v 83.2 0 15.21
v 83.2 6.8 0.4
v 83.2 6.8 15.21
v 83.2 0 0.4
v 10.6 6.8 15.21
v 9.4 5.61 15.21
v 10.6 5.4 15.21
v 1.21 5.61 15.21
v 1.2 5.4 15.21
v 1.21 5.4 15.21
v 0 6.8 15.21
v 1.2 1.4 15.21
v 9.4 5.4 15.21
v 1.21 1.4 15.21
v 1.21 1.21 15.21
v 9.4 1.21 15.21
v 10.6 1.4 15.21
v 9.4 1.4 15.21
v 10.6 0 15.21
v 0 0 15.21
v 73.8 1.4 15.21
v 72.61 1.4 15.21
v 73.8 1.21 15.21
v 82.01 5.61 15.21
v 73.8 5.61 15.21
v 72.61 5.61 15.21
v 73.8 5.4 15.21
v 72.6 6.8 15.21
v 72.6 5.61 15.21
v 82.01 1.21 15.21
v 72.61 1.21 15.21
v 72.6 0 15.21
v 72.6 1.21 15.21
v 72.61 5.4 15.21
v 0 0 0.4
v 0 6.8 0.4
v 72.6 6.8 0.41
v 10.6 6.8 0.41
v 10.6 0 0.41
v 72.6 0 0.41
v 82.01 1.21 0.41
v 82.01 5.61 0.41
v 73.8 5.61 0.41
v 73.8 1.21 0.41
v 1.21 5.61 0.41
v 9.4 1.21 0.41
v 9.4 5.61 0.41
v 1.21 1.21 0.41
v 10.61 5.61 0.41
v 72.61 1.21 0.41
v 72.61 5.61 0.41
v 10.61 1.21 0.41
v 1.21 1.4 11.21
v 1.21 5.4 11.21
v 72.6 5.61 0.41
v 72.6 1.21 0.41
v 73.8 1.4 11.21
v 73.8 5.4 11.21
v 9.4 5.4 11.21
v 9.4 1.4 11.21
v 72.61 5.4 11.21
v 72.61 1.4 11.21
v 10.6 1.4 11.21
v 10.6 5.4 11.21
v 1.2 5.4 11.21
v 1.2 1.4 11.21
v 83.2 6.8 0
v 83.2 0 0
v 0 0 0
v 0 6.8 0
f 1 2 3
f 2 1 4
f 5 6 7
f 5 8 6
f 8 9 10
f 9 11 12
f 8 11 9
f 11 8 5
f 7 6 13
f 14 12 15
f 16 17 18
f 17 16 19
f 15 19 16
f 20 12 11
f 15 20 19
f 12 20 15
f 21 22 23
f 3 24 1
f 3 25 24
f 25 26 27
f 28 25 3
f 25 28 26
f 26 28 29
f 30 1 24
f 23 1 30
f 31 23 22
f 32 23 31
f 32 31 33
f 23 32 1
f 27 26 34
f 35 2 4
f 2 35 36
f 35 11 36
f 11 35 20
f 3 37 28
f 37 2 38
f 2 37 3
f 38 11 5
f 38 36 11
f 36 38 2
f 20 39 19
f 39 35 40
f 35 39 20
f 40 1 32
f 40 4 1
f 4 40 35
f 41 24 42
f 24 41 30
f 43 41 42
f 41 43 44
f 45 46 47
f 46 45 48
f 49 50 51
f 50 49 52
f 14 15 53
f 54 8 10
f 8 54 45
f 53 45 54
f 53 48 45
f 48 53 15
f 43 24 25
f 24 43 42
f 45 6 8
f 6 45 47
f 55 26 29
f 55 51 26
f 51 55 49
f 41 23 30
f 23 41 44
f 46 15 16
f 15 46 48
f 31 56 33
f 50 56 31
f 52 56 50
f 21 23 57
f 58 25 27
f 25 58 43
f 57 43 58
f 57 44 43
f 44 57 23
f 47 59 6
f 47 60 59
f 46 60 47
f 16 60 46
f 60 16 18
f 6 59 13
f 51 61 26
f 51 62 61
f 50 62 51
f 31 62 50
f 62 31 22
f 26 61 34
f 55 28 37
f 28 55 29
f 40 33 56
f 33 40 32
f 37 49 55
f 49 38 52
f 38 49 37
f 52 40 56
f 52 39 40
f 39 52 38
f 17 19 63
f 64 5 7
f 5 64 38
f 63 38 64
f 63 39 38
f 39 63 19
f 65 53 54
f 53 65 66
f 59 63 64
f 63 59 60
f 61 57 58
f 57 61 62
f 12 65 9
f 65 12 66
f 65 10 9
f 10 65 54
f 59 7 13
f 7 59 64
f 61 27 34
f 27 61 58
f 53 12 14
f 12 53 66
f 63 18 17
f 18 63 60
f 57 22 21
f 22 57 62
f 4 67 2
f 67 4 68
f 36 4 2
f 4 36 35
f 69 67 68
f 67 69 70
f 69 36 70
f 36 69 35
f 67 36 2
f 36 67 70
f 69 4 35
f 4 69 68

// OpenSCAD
// file: ../../Base/Rotation.scad
// Fischertechnik Box Foundation
// Geometry Helpers Rotation

include <PlacementOptions.scad>

// getRotatedSpace(space, rotation=NoRotation)
// Rotates the space dependent on the specified rotation

function getRotatedSpace(space, rotation=NoRotation) = [
    (rotation == Rotate90 || rotation == Rotate270) ? space.y : space.x,
    (rotation == Rotate90 || rotation == Rotate270) ? space.x : space.y
];

// Rotates the given space around the fixed left lower corner
// space = the space the children needs as width/depth list [width,depth]
// rotation = 0 Rotate0 degrees, 1 Rotate90 degrees, 2 Rotate180 degrees, 3 Rotate270 degrees (equivalent to -90)

module RotateFix(space, rotation=NoRotation) {
    dy = (rotation == Rotate0 || rotation == Rotate270) ? 0 :
        (rotation == Rotate90) ? space.x :
        space.y;
    dx = (rotation < Rotate180) ? 0 :
        (rotation == Rotate180) ? space.x :
        space.y;
    
    translate([dx, dy, 0])
        rotate([0, 0, rotations[rotation]])
            children();
}
// file: ../../Base/Alignment.scad
// Fischertechnik Box Foundation
// Geometry Helpers Alignment

include <PlacementOptions.scad>

// getAlignedX(elementWidth, spaceWidth, align=AlignRight, offset=0)
// Gets the aligned X offset of an element with the given
// width in the given space.
// elementWidth = The width of the element to positon
// spaceWidth = The space where the element should be aligned
// align = 0 AlignLeft, 1 AlignCenter, 2 AlignRight
// offset = an optional offset from the aligned position. When
// aligned left or centered, then positive values are in X direction.
// When aligned right then positive values are in negative X direction.

function getAlignedX(elementWidth, spaceWidth, align=AlignRight, offset=0) =
    (align == AlignLeft) ?
        offset :
        ((align == AlignCenter) ?
        (spaceWidth - elementWidth)/2 + offset :
        spaceWidth - offset - elementWidth);

// getAlignedY(elementDepth, spaceDepth, align=AlignTop, offset=0)
// Gets the aligned Y offset of an element with the given
// depth in the given space.
// elementDepth = The depth of the element to positon
// spaceDepth = The space where the element should be aligned
// align = 0 AlignBottom, 1 AlignCenter, 2 AlignTop
// offset = an optional offset from the aligned position. When
// aligned bottom or centered, then positive values are in Y direction.
// When aligned top then positive values are in negative Y direction.

function getAlignedY(elementDepth, spaceDepth, align=AlignTop, offset=0) =
    (align == AlignBottom) ?
        offset :
        ((align == AlignCenter) ?
        (spaceDepth - elementDepth)/2 + offset :
        spaceDepth - offset - elementDepth);
// file: ../../Base/Boxes.scad
// Fischertechnik Box Foundation
// Pre-designed Boxes

use <Constants.scad>

include <PlacementOptions.scad>

box190Width = 190;
box190Depth = 130;
box130Width = 130;
box130Depth = 95;

// Values are from an original ec3 box
topBottomDifference = 1.5;
outerHeight = 40;
innerHeight = 38.2;
baseThickness = outerHeight - innerHeight;
stackExcess = 5.7;
radius = 3.5;
wallThickness = 1.5;
tolerance = 0.2;
stackOffset = innerHeight - stackExcess;

boxUsageHeight = stackOffset;
boxWallThickness = wallThickness;
boxBaseThickness = baseThickness;
boxWebWidth = 3.0;

// getBoxWallThickness()
// Gets the wall thickness of a Fischertechnik Box
function getBoxWallThickness() = boxWallThickness;

// getBoxUsageHeight()
// Gets the usable height of a Fischertechnik box
function getBoxUsageHeight() = boxUsageHeight;

// getBoxInnerHeight()
// Gets the inner height of a Fischertechnik box, including the stack excess
function getBoxInnerHeight() = innerHeight;

// getBoxBaseThickness()
// Gets the thickness of the Fischertechnik box base.
function getBoxBaseThickness() = boxBaseThickness;

// getBoxWebWidth()
// Gets the width of a box web
function getBoxWebWidth() = boxWebWidth;

// getBox190Space()
// Gets the usable inner space of a Box 190 as an x/y-list
function getBox190Space() = [
    box190Width - 2*getBoxWallThickness() - topBottomDifference, 
    box190Depth - 2*getBoxWallThickness() - topBottomDifference ];

// BoxBase(width, depth)
// Creates an empty stackable Fischertechnik compatible box
// width = Outer width of the box (190, 130, ...)
// depth = Outer depth of the box (130, 95, ...)

module BoxBase(width, depth, height=outerHeight) {    
    thinPlate = 0.01;

    innerHeight = height - baseThickness;    
    
    module BodyPlate(width, depth) {
        translate([radius, radius])
        hull() {
            w = width-2*radius;
            d = depth-2*radius;
            cube([w, d, thinPlate]);
            cylinder(thinPlate, r=radius, $fn=getFragments());
            translate([w, 0])
                cylinder(thinPlate, r=radius, $fn=getFragments());
            translate([w, d])
                cylinder(thinPlate, r=radius, $fn=getFragments());
            translate([0, d])
                cylinder(thinPlate, r=radius, $fn=getFragments());
        }
    }
    
    module Body(tolerance=tolerance) {
        hull() {
            // Bottom with tolerance to fit into the original boxes when stacked
            translate([-wallThickness+tolerance, -wallThickness+tolerance, -baseThickness])
                BodyPlate(width-topBottomDifference-2*tolerance, depth-topBottomDifference-2*tolerance);
            
            // Top
            translate([-wallThickness-topBottomDifference/2, -wallThickness-topBottomDifference/2, innerHeight-thinPlate])
                BodyPlate(width, depth);
         }
    }

    module Cutoff() {
        hull() {
            coWidth = width - 2*wallThickness;
            coDepth = depth - 2*wallThickness;
            
            // Bottom
            BodyPlate(coWidth-topBottomDifference, coDepth-topBottomDifference);

            // Top
            translate([-topBottomDifference/2, -topBottomDifference/2, innerHeight+thinPlate]) 
                BodyPlate(coWidth, coDepth);
        }
    }
    
    difference() {        
        Body();
        Cutoff();
        stackOffset = innerHeight - stackExcess;
        translate([0, 0, stackOffset + baseThickness])
            Body(tolerance=0);
    }
}

// Creates the Fischertechnik empty box 130x190 mm and places it at position 0,0
// 190x130 are the outer sizes, the inner space is slightly smaller. Use getBox190Space() to get the inner sizes.
// The box is positioned that the usable inner space is at the 0,0,0 position. The

module Box190() {
    BoxBase(box190Width, box190Depth);
}

// Gets the usable inner space of a Box 130 as an x/y-list
function getBox130Space() = [
    box130Width - 2*getBoxWallThickness() - topBottomDifference, 
    box130Depth - 2*getBoxWallThickness() - topBottomDifference ];

// Creates the Fischertechnik empty box 95x130 mm and places it at position 0,0
// 190x130 are the outer sizes, the inner space is slightly smaller. Use getBox190Space() to get the inner sizes.
// The box is positioned that the usable inner space is at the 0,0,0 position. The

module Box130() {
    BoxBase(box130Width, box130Depth);
}

// Creates a web at the specified box walls
// corner 0 = LowerLeft, 1 = UpperLeft, 2 = UpperRight, 3 = LowerRight
// side 0 = LeftOfCorner, 1 = RightOfCorner
// distance = Distance in mm from the corner
// boxSpace = inner width and depth of the box (default: Box 190)
// webWidth = length of the web (default is 3 mms)
// webThickness = thickness of the web (default is 1 mm)

module BoxWeb(corner, side, distance, boxSpace=getBox190Space(), webWidth=getBoxWebWidth(), webThickness=1.0) {
    sink = getBoxWallThickness()/2;

    width = (corner % 2 == 0) ? 
            (side == LeftOfCorner ? webWidth : webThickness) :
            (side == LeftOfCorner ? webThickness : webWidth);

    depth = (corner % 2 == 0) ? 
            (side == RightOfCorner ? webWidth : webThickness) :
            (side == RightOfCorner ? webThickness : webWidth);
    
    xDiff = corner == LowerLeft ? 
                (side == LeftOfCorner ? -sink : distance) :
            (corner == UpperLeft ?                
                (side == LeftOfCorner ? distance : -sink) :
            (corner == UpperRight ?
                (side == LeftOfCorner ? boxSpace.x-webWidth+sink : boxSpace.x-distance-webThickness) :
                (side == LeftOfCorner ? boxSpace.x-distance-webThickness: boxSpace.x-webWidth+sink)));

    yDiff = corner == LowerLeft ? 
                (side == RightOfCorner ? -sink : distance) :
            (corner == UpperLeft ?
                (side == RightOfCorner ? boxSpace.y-distance : boxSpace.y-webWidth+sink) :
            (corner == UpperRight ?
                (side == RightOfCorner ? boxSpace.y-webWidth+sink : boxSpace.y-distance) :
                (side == RightOfCorner ? distance : -sink)));
    
    translate([xDiff, yDiff, -getExcess()])
        cube([width, depth, boxUsageHeight + 2*getExcess()]);
}
// file: ../../Base/PlacementOptions.scad
// Fischertechnik Box Foundation
// Placement Options

// Alignment
NoAlign = 0;
AlignLeft = 1;
AlignBottom = 2;
AlignCenter = 3;
AlignRight = 4;
AlignTop = 5;

// Element rotation degree steps
rotations = [0, -90, -180, -270];

// Rotation
NoRotation = 0;
Rotate0 = 0;
Rotate90 = 1;
Rotate180 = 2;
Rotate270 = 3;

// Docking (seen from above)
NoDock = -1;
DockLeft = 0;
DockTop = 1;
DockRight = 2;
DockCorner = 2;
DockBottom = 3;

// Web corners
LowerLeft = 0;
UpperLeft = 1;
UpperRight = 2;
LowerRight = 3;

// Web position relative to corner
LeftOfCorner = 0;
RightOfCorner = 1;
// file: ../../Base/Placement.scad
// Fischertechnik Box Foundation
// Geometry Helpers Placement

use <Constants.scad>
use <Alignment.scad>
use <Rotation.scad>
use <Boxes.scad>

include <PlacementOptions.scad>

// Place(x=0, y=0, elementSpace=[0,0], alignX=AlignLeft, alignY=AlignBottom, rotation=Rotate0, boxSpace=getBox190Space())
// Places the child at the specified position
// y = Y-Position. This is a relative position when an X aligment is specified.
// x = X-Position. This is a relative position when an Y aligment is specified.
// elementSpace = space of the element to be placed [x,y]
// alignX = -1=NoAlign, 0 AlignLeft, 1 AlignCenter, 3 AlignRight (elementSpace and boxSpace required!)
// alignY = -1=NoAlign, 2 AlignBottom, 1 AlignCenter, 4 AlignTop (elementSpace and boxSpace required!)
// rotation = 0 Rotate0 0 degrees, 1 Rotate90 90 degrees, 
// 2 Rotate180 180 degrees, 3 Rotate270 270 degrees (equivalent to -90)
// boxSpace = Inner space of the box where the placement occurs [x,y] - default is Box 190x130 inner space

module Place(x=0, y=0, elementSpace=[0,0], 
  alignX=AlignLeft, alignY=AlignBottom, 
  rotation=NoRotation, boxSpace=getBox190Space()) {

    module Position(x, y, space, rotation=Rotate0) {
        translate([x, y, 0])
            RotateFix(space, rotation)
                children();
    }

    space = getRotatedSpace(elementSpace, rotation);
    alignedX = getAlignedX(space.x, boxSpace.x, alignX, x);
    alignedY = getAlignedY(space.y, boxSpace.y, alignY, y);
    Position(alignedX, alignedY, elementSpace, rotation)
        children();
}

// Center(space=getBox130Space(), elementSpace=[0,0])
// space = Space where the children is centered. For cylinder use centered=true and no elementSpace.
// elementSpace = space of the element to be centered [x,y]

module Center(space=getBox190Space(), elementSpace=[0,0]) {
    Place(elementSpace=elementSpace, boxSpace=space, alignX=AlignCenter, alignY=AlignCenter)
        children();
}

// CenterHorizontal(width=0, y=0, offset=0, space=getBox130Space())
// width = Width of the element to be placed.
// y = Y position of the element
// offset = Offset from the center position (negative will be left of the center)
// space = Space where the element is placed

module CenterHorizontal(width=0, y=0, offset=0, space=getBox190Space()) {
    Place(x=offset, y=y, elementSpace=[width, 0], boxSpace=space, alignX=AlignCenter)
        children(0);
}

// CenterVertical(depth=0, x=0, offset=0, space=getBox130Space())
// depth = Depth of the element to be placed.
// x = X position of the element
// offset = Offset from the center position (negative will be down of the center)
// space = Space where the element is placed

module CenterVertical(depth=0, x=0, offset=0, space=getBox190Space()) {
    Place(x=x, y=offset, elementSpace=[0, depth], boxSpace=space, alignY=AlignCenter)
        children(0);
}

// getIsVertical(align)
// True if the specified alignment needs a vertical orientation for a divider (AlignRight, AlignLeft)

function getIsVertical(align) = (align == AlignRight || align == AlignLeft);

// getIsHorizontal(align)
// True if the specified alignment needs a horizontal orientation for a divider (AlignTop, AlignBottom)

function getIsHorizontal(align) = (align == AlignTop || align == AlignBottom);
// file: ../../Elements/AxisClip10.scad
// Fischertechnik Box Library
// Axis for clip 10
// 31023

use <../ModelBase/Simple.scad>
use <../Base/Constants.scad>

width = 12;
depth = 12;
height = 23;
upperDiameter = 3.6;
clipHeight = 10;

// getAxisClip10Space()
// Gets the space of a frame for a clip 10 with spring ring (mot2)

function getAxisClip10Space() = [width, depth, height];

// AxisClip10(height, clipHeight)
// Axis for clip 10 with spring ring (mot2)
// height = Height of the complete axis
// clipHeight = Height of the rt for the clip (standard is 10, in mot3 its only 7)

module AxisClip10(height=height, clipHeight=clipHeight) {
    LeveledAxisWithSpace(height, height-clipHeight, getAxisClip10Space(), diameter=upperDiameter);
}

// Tests
color("lightgray")
AxisClip10();
// file: ../../Base/Constants.scad
// Fischertechnik Box Foundation
// Constants

// Constant values necessary for multiple elements

// Base constants
dividerThickness = 1.2;
excess = 0.01;
fragments = 90;
tolerance = 0.8;

// Gets the thickness of a divider 
function getDividerThickness() = dividerThickness;

// Gets the excess that is used to merge walls into each other
function getExcess() = excess;

// Gets amount of fragments of a cylinder
function getFragments() = fragments;

// Gets the inner tolerance of a frame to each side
function getTolerance() = tolerance;


// Fischertechnik specific constants
axisDiameter = 4;
axisBottomDiameter = axisDiameter + 1;
standardEdgeDistance = 2.5;
standardWebDistance = 11.5;
standardCornerLength = 15;
tubeWallFactor = 0.8;
smallPartsFrameHeight = 20;

// Gets axis diameter
function getAxisDiameter() = axisDiameter;

// Gets axis bottom diameter for thicker part at the bottom
function getAxisBottomDiameter() = axisBottomDiameter;

// gets the standard distance to the wall of the box for dockable frames with webs
function getStandardEdgeDistance() = standardEdgeDistance;

// gets the standard distance of each web to the corner of the dockable frame
function getStandardWebDistance() = standardWebDistance;

// gets the standard length of the corner walls of a dockable frame
function getStandardCornerLength() = standardCornerLength;

// gets the wall thickness of a tube.
function getTubeWallThickness() = tubeWallFactor * getDividerThickness();

// gets the frame height for docked small parts boxes.
function getSmallPartsFrameHeight() = smallPartsFrameHeight;
// file: ../../Elements/FrameAxis80.scad
// Fischertechnik Box Library
// Frame for single 80 mm Axis
// 37384

use <../ModelBase/Complex.scad>

length = 80;

// getFrameAxis80Space()
// Gets the width (.x) and depth (.y) of the axis frame.

function getFrameAxis80Space() = getFrameAxisSpace(length);

// FrameAxis80()
// Axis holder for a single 80 mm axis.

module FrameAxis80() {
    FrameAxis(length);
}

// Test
color("lightgray")
FrameAxis80();
// file: ../TestPrint.scad
// 3D Print Test Base

use <../Base/Constants.scad>

use <../Elements/AxisClip10.scad>

module TestPrint(elementSpace) {
    cube([elementSpace.x, elementSpace.y, 0.4]);
    translate([0,0,0.4+getExcess()]) {
        children();
    }
}

TestPrint(getAxisClip10Space())
    AxisClip10();
// main file
// 3D Print Test
// FrameAxis80

use <../TestPrint.scad>
use <../../Elements/FrameAxis80.scad>

TestPrint(getFrameAxis80Space())
    FrameAxis80();
